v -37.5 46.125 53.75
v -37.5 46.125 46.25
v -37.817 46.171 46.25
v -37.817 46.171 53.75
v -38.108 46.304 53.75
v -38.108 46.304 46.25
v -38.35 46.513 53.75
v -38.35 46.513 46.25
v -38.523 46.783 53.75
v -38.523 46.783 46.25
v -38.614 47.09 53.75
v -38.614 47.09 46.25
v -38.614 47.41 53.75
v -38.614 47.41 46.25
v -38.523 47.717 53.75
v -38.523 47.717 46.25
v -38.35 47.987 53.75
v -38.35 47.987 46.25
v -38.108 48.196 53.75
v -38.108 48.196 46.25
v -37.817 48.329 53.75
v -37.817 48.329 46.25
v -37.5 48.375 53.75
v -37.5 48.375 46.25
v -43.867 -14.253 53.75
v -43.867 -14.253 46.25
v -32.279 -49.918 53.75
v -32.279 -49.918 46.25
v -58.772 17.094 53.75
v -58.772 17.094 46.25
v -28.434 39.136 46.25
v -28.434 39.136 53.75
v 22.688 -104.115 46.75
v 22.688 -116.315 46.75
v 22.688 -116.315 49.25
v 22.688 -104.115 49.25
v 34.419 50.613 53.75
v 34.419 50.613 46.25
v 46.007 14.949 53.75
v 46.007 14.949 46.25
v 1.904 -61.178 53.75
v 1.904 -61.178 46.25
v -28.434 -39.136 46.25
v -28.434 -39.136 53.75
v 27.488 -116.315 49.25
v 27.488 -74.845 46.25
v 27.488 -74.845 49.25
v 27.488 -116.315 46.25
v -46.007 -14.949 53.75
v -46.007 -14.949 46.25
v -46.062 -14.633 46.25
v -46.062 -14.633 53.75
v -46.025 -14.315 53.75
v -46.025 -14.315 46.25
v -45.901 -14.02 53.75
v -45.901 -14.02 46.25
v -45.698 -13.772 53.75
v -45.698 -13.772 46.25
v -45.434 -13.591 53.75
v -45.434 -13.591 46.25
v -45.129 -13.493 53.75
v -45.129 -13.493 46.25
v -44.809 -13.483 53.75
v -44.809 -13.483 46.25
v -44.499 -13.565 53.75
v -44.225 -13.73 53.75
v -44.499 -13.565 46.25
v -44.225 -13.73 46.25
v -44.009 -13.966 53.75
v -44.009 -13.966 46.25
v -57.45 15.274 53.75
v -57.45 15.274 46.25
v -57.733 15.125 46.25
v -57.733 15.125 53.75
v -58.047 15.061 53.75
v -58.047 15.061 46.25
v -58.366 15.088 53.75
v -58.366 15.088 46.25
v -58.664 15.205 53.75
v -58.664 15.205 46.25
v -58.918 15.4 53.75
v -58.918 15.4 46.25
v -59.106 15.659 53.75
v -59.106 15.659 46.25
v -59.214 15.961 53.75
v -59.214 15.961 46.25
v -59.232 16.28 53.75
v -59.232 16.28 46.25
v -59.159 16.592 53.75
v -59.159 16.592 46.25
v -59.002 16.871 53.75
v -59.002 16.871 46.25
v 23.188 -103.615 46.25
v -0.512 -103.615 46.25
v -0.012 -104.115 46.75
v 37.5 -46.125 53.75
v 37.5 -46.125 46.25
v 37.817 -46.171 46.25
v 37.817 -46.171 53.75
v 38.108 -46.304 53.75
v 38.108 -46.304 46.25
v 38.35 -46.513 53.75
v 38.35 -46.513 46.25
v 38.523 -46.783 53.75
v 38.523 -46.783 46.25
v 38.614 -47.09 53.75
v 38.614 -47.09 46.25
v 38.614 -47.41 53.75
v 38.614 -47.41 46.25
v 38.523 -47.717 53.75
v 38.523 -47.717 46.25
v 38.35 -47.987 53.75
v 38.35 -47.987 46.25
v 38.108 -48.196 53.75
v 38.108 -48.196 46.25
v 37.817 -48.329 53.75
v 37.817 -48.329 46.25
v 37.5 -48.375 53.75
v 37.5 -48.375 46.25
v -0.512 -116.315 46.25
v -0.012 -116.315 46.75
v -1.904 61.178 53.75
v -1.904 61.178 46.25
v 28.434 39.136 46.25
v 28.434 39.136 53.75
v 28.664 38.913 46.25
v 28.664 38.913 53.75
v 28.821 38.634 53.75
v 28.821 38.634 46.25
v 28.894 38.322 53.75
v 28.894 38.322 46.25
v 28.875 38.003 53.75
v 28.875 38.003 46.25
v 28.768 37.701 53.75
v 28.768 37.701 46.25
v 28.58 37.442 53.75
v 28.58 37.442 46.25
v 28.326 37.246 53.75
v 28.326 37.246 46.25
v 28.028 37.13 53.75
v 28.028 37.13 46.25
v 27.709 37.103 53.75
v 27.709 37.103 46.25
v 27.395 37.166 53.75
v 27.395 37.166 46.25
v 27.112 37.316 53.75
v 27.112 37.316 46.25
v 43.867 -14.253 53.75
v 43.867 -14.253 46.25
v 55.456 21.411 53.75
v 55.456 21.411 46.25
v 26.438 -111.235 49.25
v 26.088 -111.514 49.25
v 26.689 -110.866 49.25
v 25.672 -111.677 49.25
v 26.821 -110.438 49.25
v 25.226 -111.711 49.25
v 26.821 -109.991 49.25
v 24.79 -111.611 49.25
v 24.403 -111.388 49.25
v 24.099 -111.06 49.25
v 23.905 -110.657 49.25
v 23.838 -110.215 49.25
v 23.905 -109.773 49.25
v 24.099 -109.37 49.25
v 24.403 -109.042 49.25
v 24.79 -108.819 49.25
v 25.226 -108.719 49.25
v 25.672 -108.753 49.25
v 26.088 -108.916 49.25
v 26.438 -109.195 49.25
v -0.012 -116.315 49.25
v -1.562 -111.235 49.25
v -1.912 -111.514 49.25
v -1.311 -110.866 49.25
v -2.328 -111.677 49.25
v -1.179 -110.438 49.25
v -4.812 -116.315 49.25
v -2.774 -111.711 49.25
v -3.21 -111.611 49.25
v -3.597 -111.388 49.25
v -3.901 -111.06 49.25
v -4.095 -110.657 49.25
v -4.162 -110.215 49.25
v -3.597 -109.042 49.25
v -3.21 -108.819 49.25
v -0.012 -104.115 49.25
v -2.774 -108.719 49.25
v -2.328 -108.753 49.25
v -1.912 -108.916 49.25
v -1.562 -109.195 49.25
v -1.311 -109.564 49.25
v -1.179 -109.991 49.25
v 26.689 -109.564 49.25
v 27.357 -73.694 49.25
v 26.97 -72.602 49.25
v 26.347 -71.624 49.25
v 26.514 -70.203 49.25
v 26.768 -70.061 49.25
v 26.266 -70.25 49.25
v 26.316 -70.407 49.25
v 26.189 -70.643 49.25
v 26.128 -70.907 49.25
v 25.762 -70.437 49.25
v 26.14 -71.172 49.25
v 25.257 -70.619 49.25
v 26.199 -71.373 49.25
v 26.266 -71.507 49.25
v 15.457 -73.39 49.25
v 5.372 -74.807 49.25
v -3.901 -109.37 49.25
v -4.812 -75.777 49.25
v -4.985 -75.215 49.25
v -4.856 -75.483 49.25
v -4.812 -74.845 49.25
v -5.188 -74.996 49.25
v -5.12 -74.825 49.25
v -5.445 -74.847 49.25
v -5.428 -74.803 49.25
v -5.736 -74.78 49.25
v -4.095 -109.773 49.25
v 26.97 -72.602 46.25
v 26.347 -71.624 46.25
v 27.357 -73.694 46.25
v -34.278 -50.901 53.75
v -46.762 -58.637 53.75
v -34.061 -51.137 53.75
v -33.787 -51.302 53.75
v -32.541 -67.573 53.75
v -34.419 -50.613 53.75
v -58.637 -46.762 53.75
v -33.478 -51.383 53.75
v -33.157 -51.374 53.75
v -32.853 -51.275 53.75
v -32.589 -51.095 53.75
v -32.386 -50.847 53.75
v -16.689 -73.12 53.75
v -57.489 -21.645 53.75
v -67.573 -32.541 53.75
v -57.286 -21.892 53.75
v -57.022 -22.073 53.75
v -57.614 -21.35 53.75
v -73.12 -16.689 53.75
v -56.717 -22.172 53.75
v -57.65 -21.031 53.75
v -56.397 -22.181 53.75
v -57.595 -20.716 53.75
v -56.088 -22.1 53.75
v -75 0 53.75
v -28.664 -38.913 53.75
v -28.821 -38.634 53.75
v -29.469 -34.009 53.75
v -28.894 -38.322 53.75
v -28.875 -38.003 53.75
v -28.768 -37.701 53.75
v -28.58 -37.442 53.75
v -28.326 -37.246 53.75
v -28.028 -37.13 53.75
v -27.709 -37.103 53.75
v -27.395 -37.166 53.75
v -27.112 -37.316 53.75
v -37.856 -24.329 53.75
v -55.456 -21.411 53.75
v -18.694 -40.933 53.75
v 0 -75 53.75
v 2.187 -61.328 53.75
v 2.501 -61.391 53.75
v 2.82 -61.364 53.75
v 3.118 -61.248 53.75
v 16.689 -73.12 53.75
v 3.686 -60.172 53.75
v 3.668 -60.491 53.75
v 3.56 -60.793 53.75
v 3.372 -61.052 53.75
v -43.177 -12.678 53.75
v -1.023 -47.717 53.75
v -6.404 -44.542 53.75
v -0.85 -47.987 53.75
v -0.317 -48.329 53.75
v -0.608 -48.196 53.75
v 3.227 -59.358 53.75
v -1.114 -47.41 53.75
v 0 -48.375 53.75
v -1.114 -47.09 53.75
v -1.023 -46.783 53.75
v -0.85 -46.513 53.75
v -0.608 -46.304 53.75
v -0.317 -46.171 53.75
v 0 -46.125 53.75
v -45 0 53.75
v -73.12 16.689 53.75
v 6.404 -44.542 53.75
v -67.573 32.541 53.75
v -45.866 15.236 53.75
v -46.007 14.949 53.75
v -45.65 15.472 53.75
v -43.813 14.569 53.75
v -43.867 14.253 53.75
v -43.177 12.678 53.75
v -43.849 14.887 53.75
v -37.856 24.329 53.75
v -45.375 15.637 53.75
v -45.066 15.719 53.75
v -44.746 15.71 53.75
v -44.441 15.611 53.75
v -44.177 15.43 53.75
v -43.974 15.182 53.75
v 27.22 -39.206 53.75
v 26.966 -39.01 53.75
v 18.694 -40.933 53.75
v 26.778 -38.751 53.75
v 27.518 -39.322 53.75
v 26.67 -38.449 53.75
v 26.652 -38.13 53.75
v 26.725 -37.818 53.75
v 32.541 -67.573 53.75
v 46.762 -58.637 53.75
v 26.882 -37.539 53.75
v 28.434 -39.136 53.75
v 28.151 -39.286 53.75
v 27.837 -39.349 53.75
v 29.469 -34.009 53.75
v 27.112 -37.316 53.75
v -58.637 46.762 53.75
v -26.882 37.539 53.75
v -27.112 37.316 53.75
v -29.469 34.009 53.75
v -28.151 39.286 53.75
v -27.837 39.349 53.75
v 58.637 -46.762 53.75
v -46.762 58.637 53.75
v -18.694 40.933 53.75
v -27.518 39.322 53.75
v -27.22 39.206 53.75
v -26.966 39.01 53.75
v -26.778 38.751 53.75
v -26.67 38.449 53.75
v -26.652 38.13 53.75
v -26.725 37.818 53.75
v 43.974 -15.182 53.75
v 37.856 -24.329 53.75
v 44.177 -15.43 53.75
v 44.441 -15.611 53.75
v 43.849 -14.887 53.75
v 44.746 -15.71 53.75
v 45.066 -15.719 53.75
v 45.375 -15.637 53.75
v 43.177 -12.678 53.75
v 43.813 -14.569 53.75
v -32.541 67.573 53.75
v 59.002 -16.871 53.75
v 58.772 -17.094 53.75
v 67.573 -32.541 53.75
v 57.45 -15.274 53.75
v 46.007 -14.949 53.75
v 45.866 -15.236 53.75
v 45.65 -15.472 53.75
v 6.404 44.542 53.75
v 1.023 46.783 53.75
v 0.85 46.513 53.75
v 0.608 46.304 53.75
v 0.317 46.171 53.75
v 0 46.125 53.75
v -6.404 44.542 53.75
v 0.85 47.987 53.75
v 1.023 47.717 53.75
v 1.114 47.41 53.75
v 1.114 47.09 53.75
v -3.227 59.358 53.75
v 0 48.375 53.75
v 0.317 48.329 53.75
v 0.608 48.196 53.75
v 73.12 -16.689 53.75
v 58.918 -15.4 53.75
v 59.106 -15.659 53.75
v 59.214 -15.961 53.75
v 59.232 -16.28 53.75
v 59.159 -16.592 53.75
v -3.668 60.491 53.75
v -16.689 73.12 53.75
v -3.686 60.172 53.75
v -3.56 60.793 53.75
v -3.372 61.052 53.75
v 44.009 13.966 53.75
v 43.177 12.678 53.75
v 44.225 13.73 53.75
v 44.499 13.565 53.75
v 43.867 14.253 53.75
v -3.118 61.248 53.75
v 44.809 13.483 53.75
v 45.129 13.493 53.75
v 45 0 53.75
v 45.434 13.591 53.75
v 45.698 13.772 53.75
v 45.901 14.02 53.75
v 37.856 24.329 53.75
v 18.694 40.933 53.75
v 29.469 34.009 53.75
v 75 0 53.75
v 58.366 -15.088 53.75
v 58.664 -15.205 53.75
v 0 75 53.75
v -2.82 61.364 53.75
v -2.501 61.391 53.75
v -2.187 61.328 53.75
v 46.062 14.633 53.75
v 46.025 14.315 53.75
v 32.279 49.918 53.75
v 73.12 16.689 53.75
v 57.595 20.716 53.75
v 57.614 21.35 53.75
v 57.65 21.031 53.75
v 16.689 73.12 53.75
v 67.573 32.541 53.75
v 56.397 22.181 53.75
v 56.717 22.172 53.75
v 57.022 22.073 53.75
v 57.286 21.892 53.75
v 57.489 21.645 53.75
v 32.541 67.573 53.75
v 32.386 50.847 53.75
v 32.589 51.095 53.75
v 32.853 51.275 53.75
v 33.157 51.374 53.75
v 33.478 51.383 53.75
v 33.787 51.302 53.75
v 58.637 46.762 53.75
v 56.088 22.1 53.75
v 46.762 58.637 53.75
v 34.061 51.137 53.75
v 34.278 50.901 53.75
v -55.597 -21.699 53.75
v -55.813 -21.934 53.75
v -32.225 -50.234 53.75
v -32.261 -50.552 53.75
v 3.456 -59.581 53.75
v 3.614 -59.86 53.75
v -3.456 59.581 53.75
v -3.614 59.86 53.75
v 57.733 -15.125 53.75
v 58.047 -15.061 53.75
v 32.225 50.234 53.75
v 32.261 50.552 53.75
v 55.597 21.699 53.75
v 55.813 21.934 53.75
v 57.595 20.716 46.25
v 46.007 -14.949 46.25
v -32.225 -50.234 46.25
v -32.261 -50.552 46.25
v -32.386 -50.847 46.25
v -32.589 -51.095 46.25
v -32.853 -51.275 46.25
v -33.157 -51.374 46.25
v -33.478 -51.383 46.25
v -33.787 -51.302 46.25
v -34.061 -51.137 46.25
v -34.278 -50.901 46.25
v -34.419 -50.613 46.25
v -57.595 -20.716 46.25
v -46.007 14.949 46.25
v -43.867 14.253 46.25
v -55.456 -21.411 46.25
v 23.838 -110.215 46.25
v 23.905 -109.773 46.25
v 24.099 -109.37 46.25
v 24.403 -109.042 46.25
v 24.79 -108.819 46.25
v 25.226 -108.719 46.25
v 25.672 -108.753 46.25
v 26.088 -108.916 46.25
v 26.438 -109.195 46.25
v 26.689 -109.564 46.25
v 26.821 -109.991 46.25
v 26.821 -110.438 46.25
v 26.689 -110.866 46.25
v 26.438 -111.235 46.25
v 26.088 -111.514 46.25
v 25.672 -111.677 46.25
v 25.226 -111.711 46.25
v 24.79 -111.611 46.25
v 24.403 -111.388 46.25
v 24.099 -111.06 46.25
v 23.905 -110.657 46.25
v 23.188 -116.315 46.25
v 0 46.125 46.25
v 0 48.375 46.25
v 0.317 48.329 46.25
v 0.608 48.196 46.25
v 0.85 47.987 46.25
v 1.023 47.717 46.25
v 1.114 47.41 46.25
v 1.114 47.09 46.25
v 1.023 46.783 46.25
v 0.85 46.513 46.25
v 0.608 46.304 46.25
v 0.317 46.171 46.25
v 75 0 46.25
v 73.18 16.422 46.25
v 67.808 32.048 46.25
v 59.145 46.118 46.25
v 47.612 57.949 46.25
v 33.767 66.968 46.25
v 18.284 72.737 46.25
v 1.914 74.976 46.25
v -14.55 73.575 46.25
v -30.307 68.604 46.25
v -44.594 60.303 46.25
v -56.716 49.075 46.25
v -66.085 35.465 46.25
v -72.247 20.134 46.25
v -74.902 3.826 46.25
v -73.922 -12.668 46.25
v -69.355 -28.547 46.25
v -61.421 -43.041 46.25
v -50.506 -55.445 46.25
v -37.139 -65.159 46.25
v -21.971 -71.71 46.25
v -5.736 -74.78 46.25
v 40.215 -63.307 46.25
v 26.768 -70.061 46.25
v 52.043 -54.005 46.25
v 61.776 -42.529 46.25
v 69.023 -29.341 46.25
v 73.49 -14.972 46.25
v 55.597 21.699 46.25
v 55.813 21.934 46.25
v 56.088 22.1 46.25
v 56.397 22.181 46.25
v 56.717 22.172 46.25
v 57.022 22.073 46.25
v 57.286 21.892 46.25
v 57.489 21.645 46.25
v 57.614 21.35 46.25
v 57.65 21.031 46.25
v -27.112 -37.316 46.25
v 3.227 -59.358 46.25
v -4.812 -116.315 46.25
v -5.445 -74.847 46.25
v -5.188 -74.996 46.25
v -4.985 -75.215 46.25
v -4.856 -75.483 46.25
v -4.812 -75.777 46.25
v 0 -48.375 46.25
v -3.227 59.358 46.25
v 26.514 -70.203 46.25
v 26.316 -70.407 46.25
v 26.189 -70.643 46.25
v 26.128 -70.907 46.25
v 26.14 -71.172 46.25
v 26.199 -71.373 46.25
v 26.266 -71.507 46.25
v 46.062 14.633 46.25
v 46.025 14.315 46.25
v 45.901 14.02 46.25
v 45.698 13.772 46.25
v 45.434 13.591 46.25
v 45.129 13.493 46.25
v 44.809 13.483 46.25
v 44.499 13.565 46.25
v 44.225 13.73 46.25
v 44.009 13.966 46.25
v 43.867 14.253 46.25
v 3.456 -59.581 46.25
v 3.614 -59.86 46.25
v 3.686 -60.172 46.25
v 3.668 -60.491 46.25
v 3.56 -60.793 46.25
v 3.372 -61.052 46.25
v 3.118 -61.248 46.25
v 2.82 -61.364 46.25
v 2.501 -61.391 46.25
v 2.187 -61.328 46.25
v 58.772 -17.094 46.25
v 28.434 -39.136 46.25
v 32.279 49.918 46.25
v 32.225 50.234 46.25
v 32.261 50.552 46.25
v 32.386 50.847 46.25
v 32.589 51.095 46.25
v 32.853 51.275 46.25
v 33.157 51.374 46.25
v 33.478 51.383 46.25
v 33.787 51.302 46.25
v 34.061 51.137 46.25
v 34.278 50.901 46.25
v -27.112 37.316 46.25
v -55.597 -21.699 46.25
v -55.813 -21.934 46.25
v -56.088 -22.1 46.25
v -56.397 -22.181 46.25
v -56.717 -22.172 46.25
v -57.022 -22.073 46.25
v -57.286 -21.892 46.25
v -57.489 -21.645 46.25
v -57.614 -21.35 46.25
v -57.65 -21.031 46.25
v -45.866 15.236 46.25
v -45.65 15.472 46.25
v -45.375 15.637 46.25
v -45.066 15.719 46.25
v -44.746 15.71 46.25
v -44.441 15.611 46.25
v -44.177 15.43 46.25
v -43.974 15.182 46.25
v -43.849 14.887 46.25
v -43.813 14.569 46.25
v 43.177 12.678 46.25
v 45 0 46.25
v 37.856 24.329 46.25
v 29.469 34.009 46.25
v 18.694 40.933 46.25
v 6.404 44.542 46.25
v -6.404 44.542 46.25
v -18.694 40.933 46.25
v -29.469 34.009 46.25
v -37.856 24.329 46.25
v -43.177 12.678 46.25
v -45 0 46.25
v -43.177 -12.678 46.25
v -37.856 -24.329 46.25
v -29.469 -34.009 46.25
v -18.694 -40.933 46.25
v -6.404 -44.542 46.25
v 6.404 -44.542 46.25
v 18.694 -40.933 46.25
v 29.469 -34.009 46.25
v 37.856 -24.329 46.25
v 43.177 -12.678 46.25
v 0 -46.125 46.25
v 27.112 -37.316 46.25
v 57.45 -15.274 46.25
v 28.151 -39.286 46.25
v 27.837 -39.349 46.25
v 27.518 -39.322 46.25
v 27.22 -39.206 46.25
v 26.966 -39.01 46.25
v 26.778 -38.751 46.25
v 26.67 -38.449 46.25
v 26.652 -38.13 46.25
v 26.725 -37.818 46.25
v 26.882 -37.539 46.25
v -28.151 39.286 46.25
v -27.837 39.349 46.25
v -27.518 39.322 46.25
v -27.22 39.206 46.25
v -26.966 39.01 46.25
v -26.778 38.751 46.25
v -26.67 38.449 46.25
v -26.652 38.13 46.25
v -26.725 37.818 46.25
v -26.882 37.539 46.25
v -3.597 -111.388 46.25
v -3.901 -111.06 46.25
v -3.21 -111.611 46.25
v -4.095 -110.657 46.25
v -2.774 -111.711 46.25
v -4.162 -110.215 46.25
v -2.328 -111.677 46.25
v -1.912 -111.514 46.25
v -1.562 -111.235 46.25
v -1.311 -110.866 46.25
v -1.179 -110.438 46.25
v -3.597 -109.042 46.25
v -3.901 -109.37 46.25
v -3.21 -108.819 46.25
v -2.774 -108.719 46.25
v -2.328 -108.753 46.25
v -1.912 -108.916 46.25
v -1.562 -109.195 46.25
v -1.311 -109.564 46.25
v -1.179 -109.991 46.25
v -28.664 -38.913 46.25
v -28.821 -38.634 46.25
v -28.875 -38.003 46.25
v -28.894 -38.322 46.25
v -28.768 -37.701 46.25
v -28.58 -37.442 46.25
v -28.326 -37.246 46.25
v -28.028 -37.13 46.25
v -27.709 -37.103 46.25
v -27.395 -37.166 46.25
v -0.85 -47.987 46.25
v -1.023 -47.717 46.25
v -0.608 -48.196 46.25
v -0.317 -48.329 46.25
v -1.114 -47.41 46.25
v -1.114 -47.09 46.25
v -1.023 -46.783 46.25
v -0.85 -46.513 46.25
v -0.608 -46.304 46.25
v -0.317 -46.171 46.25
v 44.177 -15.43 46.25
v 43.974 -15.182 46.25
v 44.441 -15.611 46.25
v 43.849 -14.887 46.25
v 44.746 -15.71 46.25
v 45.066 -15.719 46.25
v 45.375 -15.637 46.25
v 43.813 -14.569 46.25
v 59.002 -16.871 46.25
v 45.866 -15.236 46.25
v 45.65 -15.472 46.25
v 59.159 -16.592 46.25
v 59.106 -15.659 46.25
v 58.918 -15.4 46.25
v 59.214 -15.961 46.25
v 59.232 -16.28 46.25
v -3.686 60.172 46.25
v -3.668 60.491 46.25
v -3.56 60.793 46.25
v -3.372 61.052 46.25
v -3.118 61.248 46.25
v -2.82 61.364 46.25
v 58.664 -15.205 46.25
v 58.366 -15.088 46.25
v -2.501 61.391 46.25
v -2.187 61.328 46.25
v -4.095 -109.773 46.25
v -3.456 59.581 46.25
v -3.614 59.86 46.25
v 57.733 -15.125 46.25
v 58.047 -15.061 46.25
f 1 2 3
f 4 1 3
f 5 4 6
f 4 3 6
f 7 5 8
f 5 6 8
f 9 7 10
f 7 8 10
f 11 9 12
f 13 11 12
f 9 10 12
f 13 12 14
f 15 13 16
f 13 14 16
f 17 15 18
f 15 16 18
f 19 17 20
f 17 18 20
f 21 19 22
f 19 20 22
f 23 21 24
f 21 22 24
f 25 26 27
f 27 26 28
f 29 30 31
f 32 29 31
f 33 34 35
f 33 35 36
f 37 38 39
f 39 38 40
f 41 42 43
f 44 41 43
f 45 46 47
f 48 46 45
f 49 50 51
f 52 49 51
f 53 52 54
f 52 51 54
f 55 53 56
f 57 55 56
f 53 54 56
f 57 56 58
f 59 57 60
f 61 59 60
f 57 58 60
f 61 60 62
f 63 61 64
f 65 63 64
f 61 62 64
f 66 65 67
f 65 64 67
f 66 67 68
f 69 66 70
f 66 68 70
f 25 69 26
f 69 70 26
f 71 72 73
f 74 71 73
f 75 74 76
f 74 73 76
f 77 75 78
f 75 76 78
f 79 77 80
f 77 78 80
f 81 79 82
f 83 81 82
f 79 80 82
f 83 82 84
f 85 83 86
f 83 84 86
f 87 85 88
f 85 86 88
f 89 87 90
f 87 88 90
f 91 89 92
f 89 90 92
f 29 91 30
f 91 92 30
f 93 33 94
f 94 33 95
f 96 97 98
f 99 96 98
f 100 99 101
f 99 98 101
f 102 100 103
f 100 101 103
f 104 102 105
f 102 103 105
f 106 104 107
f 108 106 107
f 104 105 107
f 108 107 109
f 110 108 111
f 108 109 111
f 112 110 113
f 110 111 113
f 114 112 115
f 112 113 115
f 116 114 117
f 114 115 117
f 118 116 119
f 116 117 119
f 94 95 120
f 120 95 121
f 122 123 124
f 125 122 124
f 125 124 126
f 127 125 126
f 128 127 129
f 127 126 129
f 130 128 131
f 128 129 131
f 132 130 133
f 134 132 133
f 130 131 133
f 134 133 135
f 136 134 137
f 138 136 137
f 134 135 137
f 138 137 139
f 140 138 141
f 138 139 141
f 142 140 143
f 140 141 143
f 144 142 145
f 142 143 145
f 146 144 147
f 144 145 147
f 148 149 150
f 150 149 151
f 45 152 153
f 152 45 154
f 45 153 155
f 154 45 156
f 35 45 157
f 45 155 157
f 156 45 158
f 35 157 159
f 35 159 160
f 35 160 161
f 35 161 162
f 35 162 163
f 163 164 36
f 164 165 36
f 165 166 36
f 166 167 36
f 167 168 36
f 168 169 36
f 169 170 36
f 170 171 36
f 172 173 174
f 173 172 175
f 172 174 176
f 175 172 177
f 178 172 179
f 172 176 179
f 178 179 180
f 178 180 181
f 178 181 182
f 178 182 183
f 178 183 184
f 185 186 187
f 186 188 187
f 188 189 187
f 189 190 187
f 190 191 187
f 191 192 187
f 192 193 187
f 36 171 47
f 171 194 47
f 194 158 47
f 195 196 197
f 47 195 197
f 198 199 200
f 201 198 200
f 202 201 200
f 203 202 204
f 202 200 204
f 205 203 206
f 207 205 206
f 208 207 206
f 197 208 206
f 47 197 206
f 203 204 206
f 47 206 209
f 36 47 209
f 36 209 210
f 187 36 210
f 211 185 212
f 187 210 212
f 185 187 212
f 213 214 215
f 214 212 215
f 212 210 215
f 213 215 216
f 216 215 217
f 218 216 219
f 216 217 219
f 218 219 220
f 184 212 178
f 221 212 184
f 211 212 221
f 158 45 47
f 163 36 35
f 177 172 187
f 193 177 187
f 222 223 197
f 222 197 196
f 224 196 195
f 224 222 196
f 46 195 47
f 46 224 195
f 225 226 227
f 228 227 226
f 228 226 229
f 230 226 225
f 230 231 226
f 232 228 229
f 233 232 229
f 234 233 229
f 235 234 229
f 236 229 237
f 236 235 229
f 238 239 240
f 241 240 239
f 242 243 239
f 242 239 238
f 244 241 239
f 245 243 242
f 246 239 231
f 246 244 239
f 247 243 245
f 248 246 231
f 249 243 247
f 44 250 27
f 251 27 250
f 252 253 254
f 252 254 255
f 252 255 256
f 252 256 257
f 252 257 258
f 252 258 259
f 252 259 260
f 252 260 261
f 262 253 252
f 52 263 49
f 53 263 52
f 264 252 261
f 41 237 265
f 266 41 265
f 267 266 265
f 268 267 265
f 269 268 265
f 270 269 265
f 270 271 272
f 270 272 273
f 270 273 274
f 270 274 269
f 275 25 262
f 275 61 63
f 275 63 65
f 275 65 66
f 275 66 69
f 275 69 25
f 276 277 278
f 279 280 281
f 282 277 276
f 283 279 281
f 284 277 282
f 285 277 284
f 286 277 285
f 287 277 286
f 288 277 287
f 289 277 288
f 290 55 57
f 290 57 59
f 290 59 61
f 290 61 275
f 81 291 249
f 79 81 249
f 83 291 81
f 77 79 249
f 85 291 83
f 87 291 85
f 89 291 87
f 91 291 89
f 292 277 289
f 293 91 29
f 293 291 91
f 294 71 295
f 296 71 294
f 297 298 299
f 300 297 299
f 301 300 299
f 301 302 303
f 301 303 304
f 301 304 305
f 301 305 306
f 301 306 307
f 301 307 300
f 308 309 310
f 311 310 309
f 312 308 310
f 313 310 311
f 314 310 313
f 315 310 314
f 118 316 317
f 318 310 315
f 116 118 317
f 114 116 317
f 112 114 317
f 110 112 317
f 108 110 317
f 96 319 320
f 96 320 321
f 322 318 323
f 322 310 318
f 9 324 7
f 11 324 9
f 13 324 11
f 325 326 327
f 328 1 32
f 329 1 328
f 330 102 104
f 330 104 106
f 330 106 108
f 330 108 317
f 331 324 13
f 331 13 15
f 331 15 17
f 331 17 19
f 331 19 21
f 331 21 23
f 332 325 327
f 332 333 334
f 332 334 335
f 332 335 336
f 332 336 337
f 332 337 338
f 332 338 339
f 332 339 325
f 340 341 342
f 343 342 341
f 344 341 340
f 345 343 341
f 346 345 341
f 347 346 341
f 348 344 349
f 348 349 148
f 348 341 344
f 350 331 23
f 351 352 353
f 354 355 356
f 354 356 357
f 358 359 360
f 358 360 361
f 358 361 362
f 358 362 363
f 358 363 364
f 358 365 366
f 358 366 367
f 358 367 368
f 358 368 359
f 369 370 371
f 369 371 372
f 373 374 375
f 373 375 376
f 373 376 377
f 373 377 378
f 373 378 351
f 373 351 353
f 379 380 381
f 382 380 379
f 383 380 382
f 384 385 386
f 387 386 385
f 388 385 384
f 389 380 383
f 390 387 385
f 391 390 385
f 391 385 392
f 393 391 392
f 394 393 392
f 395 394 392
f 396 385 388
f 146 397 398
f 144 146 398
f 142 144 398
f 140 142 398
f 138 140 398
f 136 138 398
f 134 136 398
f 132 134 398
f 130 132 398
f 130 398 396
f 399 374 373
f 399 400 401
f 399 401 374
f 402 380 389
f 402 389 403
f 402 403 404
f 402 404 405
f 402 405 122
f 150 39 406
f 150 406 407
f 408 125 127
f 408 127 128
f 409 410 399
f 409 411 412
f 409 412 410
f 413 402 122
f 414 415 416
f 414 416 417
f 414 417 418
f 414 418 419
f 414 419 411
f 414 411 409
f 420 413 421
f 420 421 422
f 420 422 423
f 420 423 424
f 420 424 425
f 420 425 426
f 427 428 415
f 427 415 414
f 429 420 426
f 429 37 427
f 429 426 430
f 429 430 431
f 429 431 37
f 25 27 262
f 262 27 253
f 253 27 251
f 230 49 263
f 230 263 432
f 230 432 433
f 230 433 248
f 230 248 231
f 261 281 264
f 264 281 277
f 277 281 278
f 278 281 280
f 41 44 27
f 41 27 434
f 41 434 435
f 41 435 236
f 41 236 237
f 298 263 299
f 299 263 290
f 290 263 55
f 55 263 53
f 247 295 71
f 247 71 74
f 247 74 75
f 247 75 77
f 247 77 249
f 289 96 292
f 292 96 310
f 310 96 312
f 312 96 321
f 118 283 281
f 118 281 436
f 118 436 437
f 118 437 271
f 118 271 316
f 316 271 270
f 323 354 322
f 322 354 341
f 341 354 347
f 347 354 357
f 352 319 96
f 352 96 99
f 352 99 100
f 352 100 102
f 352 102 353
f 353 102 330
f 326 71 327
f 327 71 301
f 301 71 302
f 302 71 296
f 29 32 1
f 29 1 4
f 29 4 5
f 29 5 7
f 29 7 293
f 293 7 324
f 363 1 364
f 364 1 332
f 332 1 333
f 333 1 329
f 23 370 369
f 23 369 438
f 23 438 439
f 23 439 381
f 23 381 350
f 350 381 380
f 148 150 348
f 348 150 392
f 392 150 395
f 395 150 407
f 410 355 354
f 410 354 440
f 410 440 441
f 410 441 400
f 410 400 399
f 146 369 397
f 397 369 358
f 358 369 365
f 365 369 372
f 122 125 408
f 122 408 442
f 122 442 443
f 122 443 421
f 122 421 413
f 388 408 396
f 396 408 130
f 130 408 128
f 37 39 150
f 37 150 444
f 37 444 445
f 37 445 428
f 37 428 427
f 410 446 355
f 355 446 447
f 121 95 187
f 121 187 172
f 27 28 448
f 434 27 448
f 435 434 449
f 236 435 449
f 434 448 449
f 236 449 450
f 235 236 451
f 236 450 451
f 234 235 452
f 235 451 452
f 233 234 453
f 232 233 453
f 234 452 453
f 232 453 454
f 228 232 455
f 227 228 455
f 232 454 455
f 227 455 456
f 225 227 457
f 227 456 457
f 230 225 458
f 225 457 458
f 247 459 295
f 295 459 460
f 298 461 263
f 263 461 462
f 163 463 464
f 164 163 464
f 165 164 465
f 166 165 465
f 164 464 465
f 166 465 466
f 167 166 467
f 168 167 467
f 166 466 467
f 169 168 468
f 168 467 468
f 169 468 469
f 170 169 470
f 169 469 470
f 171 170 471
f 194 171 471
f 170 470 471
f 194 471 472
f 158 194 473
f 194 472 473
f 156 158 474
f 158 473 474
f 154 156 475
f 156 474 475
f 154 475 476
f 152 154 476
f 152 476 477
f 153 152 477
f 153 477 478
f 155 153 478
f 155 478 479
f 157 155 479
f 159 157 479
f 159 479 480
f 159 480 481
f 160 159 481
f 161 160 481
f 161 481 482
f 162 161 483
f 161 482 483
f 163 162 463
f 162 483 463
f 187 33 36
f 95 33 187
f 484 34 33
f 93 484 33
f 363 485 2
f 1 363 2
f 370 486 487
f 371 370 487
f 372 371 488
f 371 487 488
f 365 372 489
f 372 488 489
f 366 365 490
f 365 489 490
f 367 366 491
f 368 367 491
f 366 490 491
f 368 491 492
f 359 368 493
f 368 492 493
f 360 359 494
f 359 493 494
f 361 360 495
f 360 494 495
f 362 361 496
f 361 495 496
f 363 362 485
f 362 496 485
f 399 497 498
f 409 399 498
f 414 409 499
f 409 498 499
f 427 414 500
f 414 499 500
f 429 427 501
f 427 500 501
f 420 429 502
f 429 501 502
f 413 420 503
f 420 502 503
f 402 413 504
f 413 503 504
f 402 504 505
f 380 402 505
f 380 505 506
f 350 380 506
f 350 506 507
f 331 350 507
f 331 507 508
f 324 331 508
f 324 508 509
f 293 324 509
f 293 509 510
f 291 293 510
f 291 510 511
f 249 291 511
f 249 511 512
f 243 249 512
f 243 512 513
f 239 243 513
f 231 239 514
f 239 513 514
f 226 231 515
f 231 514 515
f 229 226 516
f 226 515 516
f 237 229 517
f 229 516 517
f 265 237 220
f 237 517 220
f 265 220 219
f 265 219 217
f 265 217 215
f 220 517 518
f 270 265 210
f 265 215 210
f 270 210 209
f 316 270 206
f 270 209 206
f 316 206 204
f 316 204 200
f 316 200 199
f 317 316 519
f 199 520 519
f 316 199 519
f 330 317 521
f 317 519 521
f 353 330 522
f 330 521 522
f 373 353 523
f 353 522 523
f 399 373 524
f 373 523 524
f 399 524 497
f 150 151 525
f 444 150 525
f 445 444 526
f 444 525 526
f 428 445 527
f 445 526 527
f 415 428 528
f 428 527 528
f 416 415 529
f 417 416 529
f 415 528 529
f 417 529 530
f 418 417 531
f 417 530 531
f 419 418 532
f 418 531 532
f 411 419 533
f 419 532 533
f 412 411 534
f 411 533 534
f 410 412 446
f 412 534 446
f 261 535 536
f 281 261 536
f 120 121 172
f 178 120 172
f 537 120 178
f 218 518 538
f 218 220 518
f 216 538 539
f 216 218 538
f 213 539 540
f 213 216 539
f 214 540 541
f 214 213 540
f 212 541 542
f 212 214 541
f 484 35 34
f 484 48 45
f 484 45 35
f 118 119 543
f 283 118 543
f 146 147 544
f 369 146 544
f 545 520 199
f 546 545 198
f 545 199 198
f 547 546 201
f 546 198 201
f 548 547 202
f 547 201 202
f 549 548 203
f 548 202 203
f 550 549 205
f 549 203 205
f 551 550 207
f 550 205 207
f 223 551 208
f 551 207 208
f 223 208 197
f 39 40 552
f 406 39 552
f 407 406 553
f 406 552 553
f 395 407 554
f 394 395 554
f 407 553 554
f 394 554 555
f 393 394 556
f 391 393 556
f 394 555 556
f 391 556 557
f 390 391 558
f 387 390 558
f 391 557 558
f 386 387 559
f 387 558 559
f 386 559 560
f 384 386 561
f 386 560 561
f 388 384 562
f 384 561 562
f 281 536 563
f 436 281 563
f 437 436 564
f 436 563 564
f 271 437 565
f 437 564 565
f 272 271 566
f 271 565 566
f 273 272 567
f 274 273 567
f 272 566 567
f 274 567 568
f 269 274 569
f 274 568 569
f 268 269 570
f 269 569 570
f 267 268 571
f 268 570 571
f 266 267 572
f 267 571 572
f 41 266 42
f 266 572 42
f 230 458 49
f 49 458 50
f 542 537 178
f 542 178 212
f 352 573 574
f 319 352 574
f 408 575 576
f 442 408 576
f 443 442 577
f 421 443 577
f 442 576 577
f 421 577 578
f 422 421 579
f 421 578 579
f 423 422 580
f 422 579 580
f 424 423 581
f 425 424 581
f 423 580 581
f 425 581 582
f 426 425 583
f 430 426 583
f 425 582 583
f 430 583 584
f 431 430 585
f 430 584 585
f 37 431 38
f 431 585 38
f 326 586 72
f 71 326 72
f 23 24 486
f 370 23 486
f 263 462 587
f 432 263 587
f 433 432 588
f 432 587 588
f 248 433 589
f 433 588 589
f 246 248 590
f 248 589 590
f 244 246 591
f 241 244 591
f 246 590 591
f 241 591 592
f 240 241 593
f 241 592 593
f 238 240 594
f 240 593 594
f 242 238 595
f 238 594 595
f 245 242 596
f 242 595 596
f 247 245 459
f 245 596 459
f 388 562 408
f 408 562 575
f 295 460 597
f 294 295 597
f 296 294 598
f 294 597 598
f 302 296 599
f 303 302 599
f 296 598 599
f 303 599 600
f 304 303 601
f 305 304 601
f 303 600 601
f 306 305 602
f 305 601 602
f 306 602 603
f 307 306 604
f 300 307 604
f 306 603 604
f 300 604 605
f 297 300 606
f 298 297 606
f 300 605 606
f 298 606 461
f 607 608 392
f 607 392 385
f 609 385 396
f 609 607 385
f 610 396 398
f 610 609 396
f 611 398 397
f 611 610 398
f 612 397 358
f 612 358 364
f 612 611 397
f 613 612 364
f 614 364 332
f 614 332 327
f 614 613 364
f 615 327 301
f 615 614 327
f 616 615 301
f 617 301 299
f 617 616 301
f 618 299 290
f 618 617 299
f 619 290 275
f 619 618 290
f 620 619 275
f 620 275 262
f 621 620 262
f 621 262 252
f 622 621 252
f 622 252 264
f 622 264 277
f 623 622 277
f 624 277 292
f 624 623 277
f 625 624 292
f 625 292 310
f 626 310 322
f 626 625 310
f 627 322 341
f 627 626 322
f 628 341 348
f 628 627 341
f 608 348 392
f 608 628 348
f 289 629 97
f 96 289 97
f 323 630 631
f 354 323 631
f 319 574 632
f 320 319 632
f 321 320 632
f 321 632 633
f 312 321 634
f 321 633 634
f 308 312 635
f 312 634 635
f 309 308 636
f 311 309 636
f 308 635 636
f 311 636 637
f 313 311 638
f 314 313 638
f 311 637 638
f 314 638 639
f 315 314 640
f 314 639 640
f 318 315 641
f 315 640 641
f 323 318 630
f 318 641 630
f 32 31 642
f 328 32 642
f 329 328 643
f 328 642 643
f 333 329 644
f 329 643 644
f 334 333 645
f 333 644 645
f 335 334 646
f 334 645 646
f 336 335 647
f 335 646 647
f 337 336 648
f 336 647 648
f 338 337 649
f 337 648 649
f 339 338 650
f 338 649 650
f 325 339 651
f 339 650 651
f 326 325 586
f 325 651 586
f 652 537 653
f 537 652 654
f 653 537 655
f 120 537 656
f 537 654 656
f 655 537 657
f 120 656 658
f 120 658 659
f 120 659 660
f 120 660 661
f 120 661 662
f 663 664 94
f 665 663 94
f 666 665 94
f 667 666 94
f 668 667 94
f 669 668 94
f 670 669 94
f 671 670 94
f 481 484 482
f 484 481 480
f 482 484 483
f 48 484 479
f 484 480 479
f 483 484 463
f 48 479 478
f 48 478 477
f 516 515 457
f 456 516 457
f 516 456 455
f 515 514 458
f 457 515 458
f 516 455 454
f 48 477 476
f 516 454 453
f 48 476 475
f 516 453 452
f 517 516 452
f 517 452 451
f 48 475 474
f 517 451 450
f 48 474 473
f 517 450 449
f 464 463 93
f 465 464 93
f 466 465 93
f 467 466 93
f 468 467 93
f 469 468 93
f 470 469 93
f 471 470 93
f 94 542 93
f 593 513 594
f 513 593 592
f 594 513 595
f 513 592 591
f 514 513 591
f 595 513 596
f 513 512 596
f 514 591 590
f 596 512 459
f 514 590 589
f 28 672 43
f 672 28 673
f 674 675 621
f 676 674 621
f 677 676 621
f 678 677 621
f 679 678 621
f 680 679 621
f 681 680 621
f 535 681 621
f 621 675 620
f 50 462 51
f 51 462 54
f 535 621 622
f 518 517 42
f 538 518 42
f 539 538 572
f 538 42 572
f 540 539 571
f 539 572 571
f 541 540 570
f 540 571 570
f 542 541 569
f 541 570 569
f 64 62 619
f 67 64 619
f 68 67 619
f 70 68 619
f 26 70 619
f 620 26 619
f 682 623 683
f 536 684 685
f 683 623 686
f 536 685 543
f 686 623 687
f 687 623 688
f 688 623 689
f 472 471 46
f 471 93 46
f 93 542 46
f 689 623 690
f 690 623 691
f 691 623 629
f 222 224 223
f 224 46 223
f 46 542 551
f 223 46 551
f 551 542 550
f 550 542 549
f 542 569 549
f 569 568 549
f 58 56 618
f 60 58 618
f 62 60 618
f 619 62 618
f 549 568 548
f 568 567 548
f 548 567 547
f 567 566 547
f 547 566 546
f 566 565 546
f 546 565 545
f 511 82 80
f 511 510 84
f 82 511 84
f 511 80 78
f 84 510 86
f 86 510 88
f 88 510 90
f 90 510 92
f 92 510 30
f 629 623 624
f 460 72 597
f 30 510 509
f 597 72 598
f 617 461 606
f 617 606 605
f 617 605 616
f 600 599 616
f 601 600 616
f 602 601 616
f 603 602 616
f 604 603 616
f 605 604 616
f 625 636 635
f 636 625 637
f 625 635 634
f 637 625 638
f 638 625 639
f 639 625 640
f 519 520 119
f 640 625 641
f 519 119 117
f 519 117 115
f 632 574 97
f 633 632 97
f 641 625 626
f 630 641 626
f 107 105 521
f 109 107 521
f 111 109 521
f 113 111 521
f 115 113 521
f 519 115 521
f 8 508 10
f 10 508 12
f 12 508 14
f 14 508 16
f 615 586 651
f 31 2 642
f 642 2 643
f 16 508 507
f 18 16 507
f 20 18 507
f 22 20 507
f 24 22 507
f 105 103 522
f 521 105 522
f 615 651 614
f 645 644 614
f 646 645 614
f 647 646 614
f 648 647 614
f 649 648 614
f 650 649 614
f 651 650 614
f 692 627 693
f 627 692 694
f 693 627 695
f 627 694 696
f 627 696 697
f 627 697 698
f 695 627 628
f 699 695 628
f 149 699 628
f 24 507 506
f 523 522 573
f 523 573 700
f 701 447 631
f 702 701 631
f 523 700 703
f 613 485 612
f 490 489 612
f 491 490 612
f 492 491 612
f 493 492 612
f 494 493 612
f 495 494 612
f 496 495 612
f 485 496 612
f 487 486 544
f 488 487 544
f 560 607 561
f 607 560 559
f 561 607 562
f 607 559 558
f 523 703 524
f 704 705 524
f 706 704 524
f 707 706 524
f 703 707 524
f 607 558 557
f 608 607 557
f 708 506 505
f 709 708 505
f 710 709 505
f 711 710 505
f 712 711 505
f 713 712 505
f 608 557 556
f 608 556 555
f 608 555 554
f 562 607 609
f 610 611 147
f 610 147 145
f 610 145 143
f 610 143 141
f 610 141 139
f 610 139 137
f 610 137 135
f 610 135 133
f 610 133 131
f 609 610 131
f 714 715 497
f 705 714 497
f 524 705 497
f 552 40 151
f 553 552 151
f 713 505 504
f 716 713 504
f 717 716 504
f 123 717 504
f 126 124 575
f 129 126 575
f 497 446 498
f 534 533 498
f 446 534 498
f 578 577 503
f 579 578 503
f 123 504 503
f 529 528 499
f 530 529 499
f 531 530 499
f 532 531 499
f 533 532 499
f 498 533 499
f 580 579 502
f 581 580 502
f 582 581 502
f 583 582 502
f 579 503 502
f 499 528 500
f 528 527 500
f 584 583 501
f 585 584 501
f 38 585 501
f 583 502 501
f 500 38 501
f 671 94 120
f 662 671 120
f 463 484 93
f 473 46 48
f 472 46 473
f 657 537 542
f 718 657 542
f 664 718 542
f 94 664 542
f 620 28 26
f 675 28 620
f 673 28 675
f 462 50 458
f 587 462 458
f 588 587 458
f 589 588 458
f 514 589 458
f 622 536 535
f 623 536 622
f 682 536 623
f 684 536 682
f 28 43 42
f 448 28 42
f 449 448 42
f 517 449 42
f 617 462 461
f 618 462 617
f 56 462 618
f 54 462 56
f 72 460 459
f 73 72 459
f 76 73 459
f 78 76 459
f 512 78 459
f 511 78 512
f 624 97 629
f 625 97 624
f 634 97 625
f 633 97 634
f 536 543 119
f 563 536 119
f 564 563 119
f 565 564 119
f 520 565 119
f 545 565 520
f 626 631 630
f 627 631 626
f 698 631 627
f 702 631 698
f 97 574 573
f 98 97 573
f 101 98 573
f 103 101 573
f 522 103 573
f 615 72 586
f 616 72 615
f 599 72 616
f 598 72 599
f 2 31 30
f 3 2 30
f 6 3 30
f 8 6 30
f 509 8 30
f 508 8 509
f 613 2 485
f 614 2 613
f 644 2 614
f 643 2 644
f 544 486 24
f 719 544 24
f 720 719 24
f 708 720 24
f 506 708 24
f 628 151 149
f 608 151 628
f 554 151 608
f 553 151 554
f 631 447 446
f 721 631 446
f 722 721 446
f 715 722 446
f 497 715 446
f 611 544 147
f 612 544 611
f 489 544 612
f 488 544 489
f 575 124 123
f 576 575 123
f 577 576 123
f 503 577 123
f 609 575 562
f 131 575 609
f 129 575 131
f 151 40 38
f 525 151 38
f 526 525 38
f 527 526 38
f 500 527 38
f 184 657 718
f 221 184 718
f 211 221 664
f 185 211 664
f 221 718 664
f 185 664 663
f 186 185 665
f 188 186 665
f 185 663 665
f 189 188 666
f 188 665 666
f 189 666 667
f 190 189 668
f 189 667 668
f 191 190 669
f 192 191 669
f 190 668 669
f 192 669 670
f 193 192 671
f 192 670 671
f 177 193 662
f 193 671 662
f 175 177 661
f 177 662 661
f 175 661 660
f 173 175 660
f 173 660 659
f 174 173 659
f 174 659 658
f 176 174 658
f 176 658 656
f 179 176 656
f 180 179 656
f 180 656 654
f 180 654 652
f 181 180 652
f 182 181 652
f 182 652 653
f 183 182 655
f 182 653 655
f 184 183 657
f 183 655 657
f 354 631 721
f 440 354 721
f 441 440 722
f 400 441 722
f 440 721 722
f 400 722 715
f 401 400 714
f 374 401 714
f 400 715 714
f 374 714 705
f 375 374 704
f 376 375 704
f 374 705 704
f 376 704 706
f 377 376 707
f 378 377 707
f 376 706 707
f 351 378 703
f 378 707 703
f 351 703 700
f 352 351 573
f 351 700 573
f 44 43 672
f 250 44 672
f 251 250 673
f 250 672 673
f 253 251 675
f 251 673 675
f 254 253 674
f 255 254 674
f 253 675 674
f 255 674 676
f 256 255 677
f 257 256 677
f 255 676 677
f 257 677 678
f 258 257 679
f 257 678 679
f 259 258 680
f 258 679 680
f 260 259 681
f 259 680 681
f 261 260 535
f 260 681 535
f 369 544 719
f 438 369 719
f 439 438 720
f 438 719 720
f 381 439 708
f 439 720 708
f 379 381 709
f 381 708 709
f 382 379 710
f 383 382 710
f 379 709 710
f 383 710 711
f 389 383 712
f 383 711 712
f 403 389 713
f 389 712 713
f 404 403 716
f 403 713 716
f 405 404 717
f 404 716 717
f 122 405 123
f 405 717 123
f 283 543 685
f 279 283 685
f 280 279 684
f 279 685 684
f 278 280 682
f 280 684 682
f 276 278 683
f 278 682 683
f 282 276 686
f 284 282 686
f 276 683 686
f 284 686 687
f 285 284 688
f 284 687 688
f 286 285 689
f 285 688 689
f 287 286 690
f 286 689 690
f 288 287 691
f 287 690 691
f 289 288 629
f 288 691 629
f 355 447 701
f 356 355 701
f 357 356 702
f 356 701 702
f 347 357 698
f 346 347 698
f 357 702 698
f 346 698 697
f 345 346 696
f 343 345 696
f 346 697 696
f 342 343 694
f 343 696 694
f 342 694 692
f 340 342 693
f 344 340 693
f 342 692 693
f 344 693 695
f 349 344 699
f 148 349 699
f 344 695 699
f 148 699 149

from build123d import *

# Parameters (mm, degrees)
SKETCH1_R           = 1000
SKETCH1_R_2         = 600
BOSS_EXTRUDE1_DEPTH = 100
ECHELLE1_SCALE      = 0.075
ESQUISSE1_R         = 1.5
BOSS_EXTRU_1_DEPTH  = 3
CONG_1_R            = 1
CONG_3_R            = 1
CHANFREIN1_SIZE     = 0.5


with BuildPart() as part:
    # Sketch1 → Boss-Extrude1 (new body)
    with BuildSketch(Plane.XY):
        Circle(SKETCH1_R)
        Circle(SKETCH1_R_2, mode=Mode.SUBTRACT)
        with BuildLine():
            Line((0, 615), (-500, 615))
            ThreePointArc((-500, 615), (-515, 630), (-500, 645))
            Line((-500, 645), (0, 645))
            ThreePointArc((0, 645), (15, 630), (0, 615))
        make_face(mode=Mode.SUBTRACT)
        with BuildLine():
            Line((361.48793016, 497.54545154), (-43.020567028, 791.438077687))
            ThreePointArc((-43.020567028, 791.438077687), (-46.339043159, 812.390111387), (-25.387009459, 815.708587518))
            Line((-25.387009459, 815.708587518), (379.121487729, 521.815961372))
            ThreePointArc((379.121487729, 521.815961372), (382.43996386, 500.863927672), (361.48793016, 497.54545154))
        make_face(mode=Mode.SUBTRACT)
        with BuildLine():
            Line((584.899757522, 190.04545154), (430.391260334, 665.573709688))
            ThreePointArc((430.391260334, 665.573709688), (440.021853163, 684.474812348), (458.922955823, 674.84421952))
            Line((458.922955823, 674.84421952), (613.43145301, 199.315961372))
            ThreePointArc((613.43145301, 199.315961372), (603.800860182, 180.414858712), (584.899757522, 190.04545154))
        make_face(mode=Mode.SUBTRACT)
        with BuildLine():
            Line((584.899757521, -190.045451541), (739.408254709, 285.482806607))
            ThreePointArc((739.408254709, 285.482806607), (758.309357369, 295.113399436), (767.939950198, 276.212296776))
            Line((767.939950198, 276.212296776), (613.43145301, -199.315961372))
            ThreePointArc((613.43145301, -199.315961372), (594.53035035, -208.946554201), (584.899757521, -190.045451541))
        make_face(mode=Mode.SUBTRACT)
        with BuildLine():
            Line((361.48793016, -497.545451541), (765.996427348, -203.652825394))
            ThreePointArc((765.996427348, -203.652825394), (786.948461048, -206.971301525), (783.629984916, -227.923335225))
            Line((783.629984916, -227.923335225), (379.121487729, -521.815961372))
            ThreePointArc((379.121487729, -521.815961372), (358.169454029, -518.497485241), (361.48793016, -497.545451541))
        make_face(mode=Mode.SUBTRACT)
        with BuildLine():
            Line((0, -615), (500, -615))
            ThreePointArc((500, -615), (515, -630), (500, -645))
            Line((500, -645), (0, -645))
            ThreePointArc((0, -645), (-15, -630), (0, -615))
        make_face(mode=Mode.SUBTRACT)
        with BuildLine():
            Line((-361.48793016, -497.54545154), (43.020567028, -791.438077687))
            ThreePointArc((43.020567028, -791.438077687), (46.339043159, -812.390111387), (25.387009459, -815.708587518))
            Line((25.387009459, -815.708587518), (-379.121487729, -521.815961372))
            ThreePointArc((-379.121487729, -521.815961372), (-382.43996386, -500.863927672), (-361.48793016, -497.54545154))
        make_face(mode=Mode.SUBTRACT)
        with BuildLine():
            Line((-584.899757522, -190.04545154), (-430.391260334, -665.573709688))
            ThreePointArc((-430.391260334, -665.573709688), (-440.021853163, -684.474812348), (-458.922955823, -674.84421952))
            Line((-458.922955823, -674.84421952), (-613.43145301, -199.315961372))
            ThreePointArc((-613.43145301, -199.315961372), (-603.800860182, -180.414858712), (-584.899757522, -190.04545154))
        make_face(mode=Mode.SUBTRACT)
        with BuildLine():
            Line((-584.899757521, 190.045451541), (-739.408254709, -285.482806607))
            ThreePointArc((-739.408254709, -285.482806607), (-758.309357369, -295.113399436), (-767.939950198, -276.212296776))
            Line((-767.939950198, -276.212296776), (-613.43145301, 199.315961372))
            ThreePointArc((-613.43145301, 199.315961372), (-594.53035035, 208.946554201), (-584.899757521, 190.045451541))
        make_face(mode=Mode.SUBTRACT)
        with BuildLine():
            Line((-361.48793016, 497.545451541), (-765.996427347, 203.652825394))
            ThreePointArc((-765.996427347, 203.652825394), (-786.948461048, 206.971301525), (-783.629984916, 227.923335225))
            Line((-783.629984916, 227.923335225), (-379.121487728, 521.815961372))
            ThreePointArc((-379.121487728, 521.815961372), (-358.169454028, 518.497485241), (-361.48793016, 497.545451541))
        make_face(mode=Mode.SUBTRACT)
    extrude(amount=BOSS_EXTRUDE1_DEPTH)


with BuildPart() as part_1:
    # Echelle1: scaled about (0, 0, 50)
    add(part.part.scale(ECHELLE1_SCALE).moved(Location((0, 0, 46.25))))

    # Esquisse1 → Boss.-Extru.1 (add)
    with BuildSketch(Plane(origin=(0, 0, 46.25), x_dir=(-1, 0, 0), z_dir=(0, 0, -1))):
        with BuildLine():
            Line((0.012013665, -104.11489824), (0.012013665, -116.31489824))
            Line((0.012013665, -116.31489824), (4.812013665, -116.31489824))
            Line((4.812013665, -116.31489824), (4.812013665, -74.845470968))
            ThreePointArc((4.812013665, -74.845470968), (-10.438835143, -74.26998533), (-25.257433458, -70.619133775))
            ThreePointArc((-25.257433458, -70.619133775), (-26.896134951, -72.45605199), (-27.487986335, -74.845470968))
            Line((-27.487986335, -74.845470968), (-27.487986335, -116.31489824))
            Line((-27.487986335, -116.31489824), (-22.687986335, -116.31489824))
            Line((-22.687986335, -116.31489824), (-22.687986335, -104.11489824))
            Line((-22.687986335, -104.11489824), (0.012013665, -104.11489824))
        make_face()
        with Locations((-25.337986335, -110.21489824)):
            Circle(ESQUISSE1_R, mode=Mode.SUBTRACT)
        with Locations((2.662013665, -110.21489824)):
            Circle(ESQUISSE1_R, mode=Mode.SUBTRACT)
    extrude(amount=-BOSS_EXTRU_1_DEPTH)

    # Congé1
    cong_1_edges = [part_1.edges().sort_by_distance(p)[0] for p in [
        (25.257433458, -70.619133775, 47.75),
    ]]
    fillet(cong_1_edges, radius=CONG_1_R)

    # Congé3
    cong_3_edges = [part_1.edges().sort_by_distance(p)[0] for p in [
        (-4.812013665, -74.845470968, 47.75),
    ]]
    fillet(cong_3_edges, radius=CONG_3_R)

    # Chanfrein1
    chanfrein1_edges = [part_1.edges().sort_by_distance(p)[0] for p in [
        (22.687986335, -110.21489824, 46.25),
        (11.337986335, -104.11489824, 46.25),
        (-0.012013665, -110.21489824, 46.25),
    ]]
    chamfer(chanfrein1_edges, length=CHANFREIN1_SIZE)


solid = part_1.part
